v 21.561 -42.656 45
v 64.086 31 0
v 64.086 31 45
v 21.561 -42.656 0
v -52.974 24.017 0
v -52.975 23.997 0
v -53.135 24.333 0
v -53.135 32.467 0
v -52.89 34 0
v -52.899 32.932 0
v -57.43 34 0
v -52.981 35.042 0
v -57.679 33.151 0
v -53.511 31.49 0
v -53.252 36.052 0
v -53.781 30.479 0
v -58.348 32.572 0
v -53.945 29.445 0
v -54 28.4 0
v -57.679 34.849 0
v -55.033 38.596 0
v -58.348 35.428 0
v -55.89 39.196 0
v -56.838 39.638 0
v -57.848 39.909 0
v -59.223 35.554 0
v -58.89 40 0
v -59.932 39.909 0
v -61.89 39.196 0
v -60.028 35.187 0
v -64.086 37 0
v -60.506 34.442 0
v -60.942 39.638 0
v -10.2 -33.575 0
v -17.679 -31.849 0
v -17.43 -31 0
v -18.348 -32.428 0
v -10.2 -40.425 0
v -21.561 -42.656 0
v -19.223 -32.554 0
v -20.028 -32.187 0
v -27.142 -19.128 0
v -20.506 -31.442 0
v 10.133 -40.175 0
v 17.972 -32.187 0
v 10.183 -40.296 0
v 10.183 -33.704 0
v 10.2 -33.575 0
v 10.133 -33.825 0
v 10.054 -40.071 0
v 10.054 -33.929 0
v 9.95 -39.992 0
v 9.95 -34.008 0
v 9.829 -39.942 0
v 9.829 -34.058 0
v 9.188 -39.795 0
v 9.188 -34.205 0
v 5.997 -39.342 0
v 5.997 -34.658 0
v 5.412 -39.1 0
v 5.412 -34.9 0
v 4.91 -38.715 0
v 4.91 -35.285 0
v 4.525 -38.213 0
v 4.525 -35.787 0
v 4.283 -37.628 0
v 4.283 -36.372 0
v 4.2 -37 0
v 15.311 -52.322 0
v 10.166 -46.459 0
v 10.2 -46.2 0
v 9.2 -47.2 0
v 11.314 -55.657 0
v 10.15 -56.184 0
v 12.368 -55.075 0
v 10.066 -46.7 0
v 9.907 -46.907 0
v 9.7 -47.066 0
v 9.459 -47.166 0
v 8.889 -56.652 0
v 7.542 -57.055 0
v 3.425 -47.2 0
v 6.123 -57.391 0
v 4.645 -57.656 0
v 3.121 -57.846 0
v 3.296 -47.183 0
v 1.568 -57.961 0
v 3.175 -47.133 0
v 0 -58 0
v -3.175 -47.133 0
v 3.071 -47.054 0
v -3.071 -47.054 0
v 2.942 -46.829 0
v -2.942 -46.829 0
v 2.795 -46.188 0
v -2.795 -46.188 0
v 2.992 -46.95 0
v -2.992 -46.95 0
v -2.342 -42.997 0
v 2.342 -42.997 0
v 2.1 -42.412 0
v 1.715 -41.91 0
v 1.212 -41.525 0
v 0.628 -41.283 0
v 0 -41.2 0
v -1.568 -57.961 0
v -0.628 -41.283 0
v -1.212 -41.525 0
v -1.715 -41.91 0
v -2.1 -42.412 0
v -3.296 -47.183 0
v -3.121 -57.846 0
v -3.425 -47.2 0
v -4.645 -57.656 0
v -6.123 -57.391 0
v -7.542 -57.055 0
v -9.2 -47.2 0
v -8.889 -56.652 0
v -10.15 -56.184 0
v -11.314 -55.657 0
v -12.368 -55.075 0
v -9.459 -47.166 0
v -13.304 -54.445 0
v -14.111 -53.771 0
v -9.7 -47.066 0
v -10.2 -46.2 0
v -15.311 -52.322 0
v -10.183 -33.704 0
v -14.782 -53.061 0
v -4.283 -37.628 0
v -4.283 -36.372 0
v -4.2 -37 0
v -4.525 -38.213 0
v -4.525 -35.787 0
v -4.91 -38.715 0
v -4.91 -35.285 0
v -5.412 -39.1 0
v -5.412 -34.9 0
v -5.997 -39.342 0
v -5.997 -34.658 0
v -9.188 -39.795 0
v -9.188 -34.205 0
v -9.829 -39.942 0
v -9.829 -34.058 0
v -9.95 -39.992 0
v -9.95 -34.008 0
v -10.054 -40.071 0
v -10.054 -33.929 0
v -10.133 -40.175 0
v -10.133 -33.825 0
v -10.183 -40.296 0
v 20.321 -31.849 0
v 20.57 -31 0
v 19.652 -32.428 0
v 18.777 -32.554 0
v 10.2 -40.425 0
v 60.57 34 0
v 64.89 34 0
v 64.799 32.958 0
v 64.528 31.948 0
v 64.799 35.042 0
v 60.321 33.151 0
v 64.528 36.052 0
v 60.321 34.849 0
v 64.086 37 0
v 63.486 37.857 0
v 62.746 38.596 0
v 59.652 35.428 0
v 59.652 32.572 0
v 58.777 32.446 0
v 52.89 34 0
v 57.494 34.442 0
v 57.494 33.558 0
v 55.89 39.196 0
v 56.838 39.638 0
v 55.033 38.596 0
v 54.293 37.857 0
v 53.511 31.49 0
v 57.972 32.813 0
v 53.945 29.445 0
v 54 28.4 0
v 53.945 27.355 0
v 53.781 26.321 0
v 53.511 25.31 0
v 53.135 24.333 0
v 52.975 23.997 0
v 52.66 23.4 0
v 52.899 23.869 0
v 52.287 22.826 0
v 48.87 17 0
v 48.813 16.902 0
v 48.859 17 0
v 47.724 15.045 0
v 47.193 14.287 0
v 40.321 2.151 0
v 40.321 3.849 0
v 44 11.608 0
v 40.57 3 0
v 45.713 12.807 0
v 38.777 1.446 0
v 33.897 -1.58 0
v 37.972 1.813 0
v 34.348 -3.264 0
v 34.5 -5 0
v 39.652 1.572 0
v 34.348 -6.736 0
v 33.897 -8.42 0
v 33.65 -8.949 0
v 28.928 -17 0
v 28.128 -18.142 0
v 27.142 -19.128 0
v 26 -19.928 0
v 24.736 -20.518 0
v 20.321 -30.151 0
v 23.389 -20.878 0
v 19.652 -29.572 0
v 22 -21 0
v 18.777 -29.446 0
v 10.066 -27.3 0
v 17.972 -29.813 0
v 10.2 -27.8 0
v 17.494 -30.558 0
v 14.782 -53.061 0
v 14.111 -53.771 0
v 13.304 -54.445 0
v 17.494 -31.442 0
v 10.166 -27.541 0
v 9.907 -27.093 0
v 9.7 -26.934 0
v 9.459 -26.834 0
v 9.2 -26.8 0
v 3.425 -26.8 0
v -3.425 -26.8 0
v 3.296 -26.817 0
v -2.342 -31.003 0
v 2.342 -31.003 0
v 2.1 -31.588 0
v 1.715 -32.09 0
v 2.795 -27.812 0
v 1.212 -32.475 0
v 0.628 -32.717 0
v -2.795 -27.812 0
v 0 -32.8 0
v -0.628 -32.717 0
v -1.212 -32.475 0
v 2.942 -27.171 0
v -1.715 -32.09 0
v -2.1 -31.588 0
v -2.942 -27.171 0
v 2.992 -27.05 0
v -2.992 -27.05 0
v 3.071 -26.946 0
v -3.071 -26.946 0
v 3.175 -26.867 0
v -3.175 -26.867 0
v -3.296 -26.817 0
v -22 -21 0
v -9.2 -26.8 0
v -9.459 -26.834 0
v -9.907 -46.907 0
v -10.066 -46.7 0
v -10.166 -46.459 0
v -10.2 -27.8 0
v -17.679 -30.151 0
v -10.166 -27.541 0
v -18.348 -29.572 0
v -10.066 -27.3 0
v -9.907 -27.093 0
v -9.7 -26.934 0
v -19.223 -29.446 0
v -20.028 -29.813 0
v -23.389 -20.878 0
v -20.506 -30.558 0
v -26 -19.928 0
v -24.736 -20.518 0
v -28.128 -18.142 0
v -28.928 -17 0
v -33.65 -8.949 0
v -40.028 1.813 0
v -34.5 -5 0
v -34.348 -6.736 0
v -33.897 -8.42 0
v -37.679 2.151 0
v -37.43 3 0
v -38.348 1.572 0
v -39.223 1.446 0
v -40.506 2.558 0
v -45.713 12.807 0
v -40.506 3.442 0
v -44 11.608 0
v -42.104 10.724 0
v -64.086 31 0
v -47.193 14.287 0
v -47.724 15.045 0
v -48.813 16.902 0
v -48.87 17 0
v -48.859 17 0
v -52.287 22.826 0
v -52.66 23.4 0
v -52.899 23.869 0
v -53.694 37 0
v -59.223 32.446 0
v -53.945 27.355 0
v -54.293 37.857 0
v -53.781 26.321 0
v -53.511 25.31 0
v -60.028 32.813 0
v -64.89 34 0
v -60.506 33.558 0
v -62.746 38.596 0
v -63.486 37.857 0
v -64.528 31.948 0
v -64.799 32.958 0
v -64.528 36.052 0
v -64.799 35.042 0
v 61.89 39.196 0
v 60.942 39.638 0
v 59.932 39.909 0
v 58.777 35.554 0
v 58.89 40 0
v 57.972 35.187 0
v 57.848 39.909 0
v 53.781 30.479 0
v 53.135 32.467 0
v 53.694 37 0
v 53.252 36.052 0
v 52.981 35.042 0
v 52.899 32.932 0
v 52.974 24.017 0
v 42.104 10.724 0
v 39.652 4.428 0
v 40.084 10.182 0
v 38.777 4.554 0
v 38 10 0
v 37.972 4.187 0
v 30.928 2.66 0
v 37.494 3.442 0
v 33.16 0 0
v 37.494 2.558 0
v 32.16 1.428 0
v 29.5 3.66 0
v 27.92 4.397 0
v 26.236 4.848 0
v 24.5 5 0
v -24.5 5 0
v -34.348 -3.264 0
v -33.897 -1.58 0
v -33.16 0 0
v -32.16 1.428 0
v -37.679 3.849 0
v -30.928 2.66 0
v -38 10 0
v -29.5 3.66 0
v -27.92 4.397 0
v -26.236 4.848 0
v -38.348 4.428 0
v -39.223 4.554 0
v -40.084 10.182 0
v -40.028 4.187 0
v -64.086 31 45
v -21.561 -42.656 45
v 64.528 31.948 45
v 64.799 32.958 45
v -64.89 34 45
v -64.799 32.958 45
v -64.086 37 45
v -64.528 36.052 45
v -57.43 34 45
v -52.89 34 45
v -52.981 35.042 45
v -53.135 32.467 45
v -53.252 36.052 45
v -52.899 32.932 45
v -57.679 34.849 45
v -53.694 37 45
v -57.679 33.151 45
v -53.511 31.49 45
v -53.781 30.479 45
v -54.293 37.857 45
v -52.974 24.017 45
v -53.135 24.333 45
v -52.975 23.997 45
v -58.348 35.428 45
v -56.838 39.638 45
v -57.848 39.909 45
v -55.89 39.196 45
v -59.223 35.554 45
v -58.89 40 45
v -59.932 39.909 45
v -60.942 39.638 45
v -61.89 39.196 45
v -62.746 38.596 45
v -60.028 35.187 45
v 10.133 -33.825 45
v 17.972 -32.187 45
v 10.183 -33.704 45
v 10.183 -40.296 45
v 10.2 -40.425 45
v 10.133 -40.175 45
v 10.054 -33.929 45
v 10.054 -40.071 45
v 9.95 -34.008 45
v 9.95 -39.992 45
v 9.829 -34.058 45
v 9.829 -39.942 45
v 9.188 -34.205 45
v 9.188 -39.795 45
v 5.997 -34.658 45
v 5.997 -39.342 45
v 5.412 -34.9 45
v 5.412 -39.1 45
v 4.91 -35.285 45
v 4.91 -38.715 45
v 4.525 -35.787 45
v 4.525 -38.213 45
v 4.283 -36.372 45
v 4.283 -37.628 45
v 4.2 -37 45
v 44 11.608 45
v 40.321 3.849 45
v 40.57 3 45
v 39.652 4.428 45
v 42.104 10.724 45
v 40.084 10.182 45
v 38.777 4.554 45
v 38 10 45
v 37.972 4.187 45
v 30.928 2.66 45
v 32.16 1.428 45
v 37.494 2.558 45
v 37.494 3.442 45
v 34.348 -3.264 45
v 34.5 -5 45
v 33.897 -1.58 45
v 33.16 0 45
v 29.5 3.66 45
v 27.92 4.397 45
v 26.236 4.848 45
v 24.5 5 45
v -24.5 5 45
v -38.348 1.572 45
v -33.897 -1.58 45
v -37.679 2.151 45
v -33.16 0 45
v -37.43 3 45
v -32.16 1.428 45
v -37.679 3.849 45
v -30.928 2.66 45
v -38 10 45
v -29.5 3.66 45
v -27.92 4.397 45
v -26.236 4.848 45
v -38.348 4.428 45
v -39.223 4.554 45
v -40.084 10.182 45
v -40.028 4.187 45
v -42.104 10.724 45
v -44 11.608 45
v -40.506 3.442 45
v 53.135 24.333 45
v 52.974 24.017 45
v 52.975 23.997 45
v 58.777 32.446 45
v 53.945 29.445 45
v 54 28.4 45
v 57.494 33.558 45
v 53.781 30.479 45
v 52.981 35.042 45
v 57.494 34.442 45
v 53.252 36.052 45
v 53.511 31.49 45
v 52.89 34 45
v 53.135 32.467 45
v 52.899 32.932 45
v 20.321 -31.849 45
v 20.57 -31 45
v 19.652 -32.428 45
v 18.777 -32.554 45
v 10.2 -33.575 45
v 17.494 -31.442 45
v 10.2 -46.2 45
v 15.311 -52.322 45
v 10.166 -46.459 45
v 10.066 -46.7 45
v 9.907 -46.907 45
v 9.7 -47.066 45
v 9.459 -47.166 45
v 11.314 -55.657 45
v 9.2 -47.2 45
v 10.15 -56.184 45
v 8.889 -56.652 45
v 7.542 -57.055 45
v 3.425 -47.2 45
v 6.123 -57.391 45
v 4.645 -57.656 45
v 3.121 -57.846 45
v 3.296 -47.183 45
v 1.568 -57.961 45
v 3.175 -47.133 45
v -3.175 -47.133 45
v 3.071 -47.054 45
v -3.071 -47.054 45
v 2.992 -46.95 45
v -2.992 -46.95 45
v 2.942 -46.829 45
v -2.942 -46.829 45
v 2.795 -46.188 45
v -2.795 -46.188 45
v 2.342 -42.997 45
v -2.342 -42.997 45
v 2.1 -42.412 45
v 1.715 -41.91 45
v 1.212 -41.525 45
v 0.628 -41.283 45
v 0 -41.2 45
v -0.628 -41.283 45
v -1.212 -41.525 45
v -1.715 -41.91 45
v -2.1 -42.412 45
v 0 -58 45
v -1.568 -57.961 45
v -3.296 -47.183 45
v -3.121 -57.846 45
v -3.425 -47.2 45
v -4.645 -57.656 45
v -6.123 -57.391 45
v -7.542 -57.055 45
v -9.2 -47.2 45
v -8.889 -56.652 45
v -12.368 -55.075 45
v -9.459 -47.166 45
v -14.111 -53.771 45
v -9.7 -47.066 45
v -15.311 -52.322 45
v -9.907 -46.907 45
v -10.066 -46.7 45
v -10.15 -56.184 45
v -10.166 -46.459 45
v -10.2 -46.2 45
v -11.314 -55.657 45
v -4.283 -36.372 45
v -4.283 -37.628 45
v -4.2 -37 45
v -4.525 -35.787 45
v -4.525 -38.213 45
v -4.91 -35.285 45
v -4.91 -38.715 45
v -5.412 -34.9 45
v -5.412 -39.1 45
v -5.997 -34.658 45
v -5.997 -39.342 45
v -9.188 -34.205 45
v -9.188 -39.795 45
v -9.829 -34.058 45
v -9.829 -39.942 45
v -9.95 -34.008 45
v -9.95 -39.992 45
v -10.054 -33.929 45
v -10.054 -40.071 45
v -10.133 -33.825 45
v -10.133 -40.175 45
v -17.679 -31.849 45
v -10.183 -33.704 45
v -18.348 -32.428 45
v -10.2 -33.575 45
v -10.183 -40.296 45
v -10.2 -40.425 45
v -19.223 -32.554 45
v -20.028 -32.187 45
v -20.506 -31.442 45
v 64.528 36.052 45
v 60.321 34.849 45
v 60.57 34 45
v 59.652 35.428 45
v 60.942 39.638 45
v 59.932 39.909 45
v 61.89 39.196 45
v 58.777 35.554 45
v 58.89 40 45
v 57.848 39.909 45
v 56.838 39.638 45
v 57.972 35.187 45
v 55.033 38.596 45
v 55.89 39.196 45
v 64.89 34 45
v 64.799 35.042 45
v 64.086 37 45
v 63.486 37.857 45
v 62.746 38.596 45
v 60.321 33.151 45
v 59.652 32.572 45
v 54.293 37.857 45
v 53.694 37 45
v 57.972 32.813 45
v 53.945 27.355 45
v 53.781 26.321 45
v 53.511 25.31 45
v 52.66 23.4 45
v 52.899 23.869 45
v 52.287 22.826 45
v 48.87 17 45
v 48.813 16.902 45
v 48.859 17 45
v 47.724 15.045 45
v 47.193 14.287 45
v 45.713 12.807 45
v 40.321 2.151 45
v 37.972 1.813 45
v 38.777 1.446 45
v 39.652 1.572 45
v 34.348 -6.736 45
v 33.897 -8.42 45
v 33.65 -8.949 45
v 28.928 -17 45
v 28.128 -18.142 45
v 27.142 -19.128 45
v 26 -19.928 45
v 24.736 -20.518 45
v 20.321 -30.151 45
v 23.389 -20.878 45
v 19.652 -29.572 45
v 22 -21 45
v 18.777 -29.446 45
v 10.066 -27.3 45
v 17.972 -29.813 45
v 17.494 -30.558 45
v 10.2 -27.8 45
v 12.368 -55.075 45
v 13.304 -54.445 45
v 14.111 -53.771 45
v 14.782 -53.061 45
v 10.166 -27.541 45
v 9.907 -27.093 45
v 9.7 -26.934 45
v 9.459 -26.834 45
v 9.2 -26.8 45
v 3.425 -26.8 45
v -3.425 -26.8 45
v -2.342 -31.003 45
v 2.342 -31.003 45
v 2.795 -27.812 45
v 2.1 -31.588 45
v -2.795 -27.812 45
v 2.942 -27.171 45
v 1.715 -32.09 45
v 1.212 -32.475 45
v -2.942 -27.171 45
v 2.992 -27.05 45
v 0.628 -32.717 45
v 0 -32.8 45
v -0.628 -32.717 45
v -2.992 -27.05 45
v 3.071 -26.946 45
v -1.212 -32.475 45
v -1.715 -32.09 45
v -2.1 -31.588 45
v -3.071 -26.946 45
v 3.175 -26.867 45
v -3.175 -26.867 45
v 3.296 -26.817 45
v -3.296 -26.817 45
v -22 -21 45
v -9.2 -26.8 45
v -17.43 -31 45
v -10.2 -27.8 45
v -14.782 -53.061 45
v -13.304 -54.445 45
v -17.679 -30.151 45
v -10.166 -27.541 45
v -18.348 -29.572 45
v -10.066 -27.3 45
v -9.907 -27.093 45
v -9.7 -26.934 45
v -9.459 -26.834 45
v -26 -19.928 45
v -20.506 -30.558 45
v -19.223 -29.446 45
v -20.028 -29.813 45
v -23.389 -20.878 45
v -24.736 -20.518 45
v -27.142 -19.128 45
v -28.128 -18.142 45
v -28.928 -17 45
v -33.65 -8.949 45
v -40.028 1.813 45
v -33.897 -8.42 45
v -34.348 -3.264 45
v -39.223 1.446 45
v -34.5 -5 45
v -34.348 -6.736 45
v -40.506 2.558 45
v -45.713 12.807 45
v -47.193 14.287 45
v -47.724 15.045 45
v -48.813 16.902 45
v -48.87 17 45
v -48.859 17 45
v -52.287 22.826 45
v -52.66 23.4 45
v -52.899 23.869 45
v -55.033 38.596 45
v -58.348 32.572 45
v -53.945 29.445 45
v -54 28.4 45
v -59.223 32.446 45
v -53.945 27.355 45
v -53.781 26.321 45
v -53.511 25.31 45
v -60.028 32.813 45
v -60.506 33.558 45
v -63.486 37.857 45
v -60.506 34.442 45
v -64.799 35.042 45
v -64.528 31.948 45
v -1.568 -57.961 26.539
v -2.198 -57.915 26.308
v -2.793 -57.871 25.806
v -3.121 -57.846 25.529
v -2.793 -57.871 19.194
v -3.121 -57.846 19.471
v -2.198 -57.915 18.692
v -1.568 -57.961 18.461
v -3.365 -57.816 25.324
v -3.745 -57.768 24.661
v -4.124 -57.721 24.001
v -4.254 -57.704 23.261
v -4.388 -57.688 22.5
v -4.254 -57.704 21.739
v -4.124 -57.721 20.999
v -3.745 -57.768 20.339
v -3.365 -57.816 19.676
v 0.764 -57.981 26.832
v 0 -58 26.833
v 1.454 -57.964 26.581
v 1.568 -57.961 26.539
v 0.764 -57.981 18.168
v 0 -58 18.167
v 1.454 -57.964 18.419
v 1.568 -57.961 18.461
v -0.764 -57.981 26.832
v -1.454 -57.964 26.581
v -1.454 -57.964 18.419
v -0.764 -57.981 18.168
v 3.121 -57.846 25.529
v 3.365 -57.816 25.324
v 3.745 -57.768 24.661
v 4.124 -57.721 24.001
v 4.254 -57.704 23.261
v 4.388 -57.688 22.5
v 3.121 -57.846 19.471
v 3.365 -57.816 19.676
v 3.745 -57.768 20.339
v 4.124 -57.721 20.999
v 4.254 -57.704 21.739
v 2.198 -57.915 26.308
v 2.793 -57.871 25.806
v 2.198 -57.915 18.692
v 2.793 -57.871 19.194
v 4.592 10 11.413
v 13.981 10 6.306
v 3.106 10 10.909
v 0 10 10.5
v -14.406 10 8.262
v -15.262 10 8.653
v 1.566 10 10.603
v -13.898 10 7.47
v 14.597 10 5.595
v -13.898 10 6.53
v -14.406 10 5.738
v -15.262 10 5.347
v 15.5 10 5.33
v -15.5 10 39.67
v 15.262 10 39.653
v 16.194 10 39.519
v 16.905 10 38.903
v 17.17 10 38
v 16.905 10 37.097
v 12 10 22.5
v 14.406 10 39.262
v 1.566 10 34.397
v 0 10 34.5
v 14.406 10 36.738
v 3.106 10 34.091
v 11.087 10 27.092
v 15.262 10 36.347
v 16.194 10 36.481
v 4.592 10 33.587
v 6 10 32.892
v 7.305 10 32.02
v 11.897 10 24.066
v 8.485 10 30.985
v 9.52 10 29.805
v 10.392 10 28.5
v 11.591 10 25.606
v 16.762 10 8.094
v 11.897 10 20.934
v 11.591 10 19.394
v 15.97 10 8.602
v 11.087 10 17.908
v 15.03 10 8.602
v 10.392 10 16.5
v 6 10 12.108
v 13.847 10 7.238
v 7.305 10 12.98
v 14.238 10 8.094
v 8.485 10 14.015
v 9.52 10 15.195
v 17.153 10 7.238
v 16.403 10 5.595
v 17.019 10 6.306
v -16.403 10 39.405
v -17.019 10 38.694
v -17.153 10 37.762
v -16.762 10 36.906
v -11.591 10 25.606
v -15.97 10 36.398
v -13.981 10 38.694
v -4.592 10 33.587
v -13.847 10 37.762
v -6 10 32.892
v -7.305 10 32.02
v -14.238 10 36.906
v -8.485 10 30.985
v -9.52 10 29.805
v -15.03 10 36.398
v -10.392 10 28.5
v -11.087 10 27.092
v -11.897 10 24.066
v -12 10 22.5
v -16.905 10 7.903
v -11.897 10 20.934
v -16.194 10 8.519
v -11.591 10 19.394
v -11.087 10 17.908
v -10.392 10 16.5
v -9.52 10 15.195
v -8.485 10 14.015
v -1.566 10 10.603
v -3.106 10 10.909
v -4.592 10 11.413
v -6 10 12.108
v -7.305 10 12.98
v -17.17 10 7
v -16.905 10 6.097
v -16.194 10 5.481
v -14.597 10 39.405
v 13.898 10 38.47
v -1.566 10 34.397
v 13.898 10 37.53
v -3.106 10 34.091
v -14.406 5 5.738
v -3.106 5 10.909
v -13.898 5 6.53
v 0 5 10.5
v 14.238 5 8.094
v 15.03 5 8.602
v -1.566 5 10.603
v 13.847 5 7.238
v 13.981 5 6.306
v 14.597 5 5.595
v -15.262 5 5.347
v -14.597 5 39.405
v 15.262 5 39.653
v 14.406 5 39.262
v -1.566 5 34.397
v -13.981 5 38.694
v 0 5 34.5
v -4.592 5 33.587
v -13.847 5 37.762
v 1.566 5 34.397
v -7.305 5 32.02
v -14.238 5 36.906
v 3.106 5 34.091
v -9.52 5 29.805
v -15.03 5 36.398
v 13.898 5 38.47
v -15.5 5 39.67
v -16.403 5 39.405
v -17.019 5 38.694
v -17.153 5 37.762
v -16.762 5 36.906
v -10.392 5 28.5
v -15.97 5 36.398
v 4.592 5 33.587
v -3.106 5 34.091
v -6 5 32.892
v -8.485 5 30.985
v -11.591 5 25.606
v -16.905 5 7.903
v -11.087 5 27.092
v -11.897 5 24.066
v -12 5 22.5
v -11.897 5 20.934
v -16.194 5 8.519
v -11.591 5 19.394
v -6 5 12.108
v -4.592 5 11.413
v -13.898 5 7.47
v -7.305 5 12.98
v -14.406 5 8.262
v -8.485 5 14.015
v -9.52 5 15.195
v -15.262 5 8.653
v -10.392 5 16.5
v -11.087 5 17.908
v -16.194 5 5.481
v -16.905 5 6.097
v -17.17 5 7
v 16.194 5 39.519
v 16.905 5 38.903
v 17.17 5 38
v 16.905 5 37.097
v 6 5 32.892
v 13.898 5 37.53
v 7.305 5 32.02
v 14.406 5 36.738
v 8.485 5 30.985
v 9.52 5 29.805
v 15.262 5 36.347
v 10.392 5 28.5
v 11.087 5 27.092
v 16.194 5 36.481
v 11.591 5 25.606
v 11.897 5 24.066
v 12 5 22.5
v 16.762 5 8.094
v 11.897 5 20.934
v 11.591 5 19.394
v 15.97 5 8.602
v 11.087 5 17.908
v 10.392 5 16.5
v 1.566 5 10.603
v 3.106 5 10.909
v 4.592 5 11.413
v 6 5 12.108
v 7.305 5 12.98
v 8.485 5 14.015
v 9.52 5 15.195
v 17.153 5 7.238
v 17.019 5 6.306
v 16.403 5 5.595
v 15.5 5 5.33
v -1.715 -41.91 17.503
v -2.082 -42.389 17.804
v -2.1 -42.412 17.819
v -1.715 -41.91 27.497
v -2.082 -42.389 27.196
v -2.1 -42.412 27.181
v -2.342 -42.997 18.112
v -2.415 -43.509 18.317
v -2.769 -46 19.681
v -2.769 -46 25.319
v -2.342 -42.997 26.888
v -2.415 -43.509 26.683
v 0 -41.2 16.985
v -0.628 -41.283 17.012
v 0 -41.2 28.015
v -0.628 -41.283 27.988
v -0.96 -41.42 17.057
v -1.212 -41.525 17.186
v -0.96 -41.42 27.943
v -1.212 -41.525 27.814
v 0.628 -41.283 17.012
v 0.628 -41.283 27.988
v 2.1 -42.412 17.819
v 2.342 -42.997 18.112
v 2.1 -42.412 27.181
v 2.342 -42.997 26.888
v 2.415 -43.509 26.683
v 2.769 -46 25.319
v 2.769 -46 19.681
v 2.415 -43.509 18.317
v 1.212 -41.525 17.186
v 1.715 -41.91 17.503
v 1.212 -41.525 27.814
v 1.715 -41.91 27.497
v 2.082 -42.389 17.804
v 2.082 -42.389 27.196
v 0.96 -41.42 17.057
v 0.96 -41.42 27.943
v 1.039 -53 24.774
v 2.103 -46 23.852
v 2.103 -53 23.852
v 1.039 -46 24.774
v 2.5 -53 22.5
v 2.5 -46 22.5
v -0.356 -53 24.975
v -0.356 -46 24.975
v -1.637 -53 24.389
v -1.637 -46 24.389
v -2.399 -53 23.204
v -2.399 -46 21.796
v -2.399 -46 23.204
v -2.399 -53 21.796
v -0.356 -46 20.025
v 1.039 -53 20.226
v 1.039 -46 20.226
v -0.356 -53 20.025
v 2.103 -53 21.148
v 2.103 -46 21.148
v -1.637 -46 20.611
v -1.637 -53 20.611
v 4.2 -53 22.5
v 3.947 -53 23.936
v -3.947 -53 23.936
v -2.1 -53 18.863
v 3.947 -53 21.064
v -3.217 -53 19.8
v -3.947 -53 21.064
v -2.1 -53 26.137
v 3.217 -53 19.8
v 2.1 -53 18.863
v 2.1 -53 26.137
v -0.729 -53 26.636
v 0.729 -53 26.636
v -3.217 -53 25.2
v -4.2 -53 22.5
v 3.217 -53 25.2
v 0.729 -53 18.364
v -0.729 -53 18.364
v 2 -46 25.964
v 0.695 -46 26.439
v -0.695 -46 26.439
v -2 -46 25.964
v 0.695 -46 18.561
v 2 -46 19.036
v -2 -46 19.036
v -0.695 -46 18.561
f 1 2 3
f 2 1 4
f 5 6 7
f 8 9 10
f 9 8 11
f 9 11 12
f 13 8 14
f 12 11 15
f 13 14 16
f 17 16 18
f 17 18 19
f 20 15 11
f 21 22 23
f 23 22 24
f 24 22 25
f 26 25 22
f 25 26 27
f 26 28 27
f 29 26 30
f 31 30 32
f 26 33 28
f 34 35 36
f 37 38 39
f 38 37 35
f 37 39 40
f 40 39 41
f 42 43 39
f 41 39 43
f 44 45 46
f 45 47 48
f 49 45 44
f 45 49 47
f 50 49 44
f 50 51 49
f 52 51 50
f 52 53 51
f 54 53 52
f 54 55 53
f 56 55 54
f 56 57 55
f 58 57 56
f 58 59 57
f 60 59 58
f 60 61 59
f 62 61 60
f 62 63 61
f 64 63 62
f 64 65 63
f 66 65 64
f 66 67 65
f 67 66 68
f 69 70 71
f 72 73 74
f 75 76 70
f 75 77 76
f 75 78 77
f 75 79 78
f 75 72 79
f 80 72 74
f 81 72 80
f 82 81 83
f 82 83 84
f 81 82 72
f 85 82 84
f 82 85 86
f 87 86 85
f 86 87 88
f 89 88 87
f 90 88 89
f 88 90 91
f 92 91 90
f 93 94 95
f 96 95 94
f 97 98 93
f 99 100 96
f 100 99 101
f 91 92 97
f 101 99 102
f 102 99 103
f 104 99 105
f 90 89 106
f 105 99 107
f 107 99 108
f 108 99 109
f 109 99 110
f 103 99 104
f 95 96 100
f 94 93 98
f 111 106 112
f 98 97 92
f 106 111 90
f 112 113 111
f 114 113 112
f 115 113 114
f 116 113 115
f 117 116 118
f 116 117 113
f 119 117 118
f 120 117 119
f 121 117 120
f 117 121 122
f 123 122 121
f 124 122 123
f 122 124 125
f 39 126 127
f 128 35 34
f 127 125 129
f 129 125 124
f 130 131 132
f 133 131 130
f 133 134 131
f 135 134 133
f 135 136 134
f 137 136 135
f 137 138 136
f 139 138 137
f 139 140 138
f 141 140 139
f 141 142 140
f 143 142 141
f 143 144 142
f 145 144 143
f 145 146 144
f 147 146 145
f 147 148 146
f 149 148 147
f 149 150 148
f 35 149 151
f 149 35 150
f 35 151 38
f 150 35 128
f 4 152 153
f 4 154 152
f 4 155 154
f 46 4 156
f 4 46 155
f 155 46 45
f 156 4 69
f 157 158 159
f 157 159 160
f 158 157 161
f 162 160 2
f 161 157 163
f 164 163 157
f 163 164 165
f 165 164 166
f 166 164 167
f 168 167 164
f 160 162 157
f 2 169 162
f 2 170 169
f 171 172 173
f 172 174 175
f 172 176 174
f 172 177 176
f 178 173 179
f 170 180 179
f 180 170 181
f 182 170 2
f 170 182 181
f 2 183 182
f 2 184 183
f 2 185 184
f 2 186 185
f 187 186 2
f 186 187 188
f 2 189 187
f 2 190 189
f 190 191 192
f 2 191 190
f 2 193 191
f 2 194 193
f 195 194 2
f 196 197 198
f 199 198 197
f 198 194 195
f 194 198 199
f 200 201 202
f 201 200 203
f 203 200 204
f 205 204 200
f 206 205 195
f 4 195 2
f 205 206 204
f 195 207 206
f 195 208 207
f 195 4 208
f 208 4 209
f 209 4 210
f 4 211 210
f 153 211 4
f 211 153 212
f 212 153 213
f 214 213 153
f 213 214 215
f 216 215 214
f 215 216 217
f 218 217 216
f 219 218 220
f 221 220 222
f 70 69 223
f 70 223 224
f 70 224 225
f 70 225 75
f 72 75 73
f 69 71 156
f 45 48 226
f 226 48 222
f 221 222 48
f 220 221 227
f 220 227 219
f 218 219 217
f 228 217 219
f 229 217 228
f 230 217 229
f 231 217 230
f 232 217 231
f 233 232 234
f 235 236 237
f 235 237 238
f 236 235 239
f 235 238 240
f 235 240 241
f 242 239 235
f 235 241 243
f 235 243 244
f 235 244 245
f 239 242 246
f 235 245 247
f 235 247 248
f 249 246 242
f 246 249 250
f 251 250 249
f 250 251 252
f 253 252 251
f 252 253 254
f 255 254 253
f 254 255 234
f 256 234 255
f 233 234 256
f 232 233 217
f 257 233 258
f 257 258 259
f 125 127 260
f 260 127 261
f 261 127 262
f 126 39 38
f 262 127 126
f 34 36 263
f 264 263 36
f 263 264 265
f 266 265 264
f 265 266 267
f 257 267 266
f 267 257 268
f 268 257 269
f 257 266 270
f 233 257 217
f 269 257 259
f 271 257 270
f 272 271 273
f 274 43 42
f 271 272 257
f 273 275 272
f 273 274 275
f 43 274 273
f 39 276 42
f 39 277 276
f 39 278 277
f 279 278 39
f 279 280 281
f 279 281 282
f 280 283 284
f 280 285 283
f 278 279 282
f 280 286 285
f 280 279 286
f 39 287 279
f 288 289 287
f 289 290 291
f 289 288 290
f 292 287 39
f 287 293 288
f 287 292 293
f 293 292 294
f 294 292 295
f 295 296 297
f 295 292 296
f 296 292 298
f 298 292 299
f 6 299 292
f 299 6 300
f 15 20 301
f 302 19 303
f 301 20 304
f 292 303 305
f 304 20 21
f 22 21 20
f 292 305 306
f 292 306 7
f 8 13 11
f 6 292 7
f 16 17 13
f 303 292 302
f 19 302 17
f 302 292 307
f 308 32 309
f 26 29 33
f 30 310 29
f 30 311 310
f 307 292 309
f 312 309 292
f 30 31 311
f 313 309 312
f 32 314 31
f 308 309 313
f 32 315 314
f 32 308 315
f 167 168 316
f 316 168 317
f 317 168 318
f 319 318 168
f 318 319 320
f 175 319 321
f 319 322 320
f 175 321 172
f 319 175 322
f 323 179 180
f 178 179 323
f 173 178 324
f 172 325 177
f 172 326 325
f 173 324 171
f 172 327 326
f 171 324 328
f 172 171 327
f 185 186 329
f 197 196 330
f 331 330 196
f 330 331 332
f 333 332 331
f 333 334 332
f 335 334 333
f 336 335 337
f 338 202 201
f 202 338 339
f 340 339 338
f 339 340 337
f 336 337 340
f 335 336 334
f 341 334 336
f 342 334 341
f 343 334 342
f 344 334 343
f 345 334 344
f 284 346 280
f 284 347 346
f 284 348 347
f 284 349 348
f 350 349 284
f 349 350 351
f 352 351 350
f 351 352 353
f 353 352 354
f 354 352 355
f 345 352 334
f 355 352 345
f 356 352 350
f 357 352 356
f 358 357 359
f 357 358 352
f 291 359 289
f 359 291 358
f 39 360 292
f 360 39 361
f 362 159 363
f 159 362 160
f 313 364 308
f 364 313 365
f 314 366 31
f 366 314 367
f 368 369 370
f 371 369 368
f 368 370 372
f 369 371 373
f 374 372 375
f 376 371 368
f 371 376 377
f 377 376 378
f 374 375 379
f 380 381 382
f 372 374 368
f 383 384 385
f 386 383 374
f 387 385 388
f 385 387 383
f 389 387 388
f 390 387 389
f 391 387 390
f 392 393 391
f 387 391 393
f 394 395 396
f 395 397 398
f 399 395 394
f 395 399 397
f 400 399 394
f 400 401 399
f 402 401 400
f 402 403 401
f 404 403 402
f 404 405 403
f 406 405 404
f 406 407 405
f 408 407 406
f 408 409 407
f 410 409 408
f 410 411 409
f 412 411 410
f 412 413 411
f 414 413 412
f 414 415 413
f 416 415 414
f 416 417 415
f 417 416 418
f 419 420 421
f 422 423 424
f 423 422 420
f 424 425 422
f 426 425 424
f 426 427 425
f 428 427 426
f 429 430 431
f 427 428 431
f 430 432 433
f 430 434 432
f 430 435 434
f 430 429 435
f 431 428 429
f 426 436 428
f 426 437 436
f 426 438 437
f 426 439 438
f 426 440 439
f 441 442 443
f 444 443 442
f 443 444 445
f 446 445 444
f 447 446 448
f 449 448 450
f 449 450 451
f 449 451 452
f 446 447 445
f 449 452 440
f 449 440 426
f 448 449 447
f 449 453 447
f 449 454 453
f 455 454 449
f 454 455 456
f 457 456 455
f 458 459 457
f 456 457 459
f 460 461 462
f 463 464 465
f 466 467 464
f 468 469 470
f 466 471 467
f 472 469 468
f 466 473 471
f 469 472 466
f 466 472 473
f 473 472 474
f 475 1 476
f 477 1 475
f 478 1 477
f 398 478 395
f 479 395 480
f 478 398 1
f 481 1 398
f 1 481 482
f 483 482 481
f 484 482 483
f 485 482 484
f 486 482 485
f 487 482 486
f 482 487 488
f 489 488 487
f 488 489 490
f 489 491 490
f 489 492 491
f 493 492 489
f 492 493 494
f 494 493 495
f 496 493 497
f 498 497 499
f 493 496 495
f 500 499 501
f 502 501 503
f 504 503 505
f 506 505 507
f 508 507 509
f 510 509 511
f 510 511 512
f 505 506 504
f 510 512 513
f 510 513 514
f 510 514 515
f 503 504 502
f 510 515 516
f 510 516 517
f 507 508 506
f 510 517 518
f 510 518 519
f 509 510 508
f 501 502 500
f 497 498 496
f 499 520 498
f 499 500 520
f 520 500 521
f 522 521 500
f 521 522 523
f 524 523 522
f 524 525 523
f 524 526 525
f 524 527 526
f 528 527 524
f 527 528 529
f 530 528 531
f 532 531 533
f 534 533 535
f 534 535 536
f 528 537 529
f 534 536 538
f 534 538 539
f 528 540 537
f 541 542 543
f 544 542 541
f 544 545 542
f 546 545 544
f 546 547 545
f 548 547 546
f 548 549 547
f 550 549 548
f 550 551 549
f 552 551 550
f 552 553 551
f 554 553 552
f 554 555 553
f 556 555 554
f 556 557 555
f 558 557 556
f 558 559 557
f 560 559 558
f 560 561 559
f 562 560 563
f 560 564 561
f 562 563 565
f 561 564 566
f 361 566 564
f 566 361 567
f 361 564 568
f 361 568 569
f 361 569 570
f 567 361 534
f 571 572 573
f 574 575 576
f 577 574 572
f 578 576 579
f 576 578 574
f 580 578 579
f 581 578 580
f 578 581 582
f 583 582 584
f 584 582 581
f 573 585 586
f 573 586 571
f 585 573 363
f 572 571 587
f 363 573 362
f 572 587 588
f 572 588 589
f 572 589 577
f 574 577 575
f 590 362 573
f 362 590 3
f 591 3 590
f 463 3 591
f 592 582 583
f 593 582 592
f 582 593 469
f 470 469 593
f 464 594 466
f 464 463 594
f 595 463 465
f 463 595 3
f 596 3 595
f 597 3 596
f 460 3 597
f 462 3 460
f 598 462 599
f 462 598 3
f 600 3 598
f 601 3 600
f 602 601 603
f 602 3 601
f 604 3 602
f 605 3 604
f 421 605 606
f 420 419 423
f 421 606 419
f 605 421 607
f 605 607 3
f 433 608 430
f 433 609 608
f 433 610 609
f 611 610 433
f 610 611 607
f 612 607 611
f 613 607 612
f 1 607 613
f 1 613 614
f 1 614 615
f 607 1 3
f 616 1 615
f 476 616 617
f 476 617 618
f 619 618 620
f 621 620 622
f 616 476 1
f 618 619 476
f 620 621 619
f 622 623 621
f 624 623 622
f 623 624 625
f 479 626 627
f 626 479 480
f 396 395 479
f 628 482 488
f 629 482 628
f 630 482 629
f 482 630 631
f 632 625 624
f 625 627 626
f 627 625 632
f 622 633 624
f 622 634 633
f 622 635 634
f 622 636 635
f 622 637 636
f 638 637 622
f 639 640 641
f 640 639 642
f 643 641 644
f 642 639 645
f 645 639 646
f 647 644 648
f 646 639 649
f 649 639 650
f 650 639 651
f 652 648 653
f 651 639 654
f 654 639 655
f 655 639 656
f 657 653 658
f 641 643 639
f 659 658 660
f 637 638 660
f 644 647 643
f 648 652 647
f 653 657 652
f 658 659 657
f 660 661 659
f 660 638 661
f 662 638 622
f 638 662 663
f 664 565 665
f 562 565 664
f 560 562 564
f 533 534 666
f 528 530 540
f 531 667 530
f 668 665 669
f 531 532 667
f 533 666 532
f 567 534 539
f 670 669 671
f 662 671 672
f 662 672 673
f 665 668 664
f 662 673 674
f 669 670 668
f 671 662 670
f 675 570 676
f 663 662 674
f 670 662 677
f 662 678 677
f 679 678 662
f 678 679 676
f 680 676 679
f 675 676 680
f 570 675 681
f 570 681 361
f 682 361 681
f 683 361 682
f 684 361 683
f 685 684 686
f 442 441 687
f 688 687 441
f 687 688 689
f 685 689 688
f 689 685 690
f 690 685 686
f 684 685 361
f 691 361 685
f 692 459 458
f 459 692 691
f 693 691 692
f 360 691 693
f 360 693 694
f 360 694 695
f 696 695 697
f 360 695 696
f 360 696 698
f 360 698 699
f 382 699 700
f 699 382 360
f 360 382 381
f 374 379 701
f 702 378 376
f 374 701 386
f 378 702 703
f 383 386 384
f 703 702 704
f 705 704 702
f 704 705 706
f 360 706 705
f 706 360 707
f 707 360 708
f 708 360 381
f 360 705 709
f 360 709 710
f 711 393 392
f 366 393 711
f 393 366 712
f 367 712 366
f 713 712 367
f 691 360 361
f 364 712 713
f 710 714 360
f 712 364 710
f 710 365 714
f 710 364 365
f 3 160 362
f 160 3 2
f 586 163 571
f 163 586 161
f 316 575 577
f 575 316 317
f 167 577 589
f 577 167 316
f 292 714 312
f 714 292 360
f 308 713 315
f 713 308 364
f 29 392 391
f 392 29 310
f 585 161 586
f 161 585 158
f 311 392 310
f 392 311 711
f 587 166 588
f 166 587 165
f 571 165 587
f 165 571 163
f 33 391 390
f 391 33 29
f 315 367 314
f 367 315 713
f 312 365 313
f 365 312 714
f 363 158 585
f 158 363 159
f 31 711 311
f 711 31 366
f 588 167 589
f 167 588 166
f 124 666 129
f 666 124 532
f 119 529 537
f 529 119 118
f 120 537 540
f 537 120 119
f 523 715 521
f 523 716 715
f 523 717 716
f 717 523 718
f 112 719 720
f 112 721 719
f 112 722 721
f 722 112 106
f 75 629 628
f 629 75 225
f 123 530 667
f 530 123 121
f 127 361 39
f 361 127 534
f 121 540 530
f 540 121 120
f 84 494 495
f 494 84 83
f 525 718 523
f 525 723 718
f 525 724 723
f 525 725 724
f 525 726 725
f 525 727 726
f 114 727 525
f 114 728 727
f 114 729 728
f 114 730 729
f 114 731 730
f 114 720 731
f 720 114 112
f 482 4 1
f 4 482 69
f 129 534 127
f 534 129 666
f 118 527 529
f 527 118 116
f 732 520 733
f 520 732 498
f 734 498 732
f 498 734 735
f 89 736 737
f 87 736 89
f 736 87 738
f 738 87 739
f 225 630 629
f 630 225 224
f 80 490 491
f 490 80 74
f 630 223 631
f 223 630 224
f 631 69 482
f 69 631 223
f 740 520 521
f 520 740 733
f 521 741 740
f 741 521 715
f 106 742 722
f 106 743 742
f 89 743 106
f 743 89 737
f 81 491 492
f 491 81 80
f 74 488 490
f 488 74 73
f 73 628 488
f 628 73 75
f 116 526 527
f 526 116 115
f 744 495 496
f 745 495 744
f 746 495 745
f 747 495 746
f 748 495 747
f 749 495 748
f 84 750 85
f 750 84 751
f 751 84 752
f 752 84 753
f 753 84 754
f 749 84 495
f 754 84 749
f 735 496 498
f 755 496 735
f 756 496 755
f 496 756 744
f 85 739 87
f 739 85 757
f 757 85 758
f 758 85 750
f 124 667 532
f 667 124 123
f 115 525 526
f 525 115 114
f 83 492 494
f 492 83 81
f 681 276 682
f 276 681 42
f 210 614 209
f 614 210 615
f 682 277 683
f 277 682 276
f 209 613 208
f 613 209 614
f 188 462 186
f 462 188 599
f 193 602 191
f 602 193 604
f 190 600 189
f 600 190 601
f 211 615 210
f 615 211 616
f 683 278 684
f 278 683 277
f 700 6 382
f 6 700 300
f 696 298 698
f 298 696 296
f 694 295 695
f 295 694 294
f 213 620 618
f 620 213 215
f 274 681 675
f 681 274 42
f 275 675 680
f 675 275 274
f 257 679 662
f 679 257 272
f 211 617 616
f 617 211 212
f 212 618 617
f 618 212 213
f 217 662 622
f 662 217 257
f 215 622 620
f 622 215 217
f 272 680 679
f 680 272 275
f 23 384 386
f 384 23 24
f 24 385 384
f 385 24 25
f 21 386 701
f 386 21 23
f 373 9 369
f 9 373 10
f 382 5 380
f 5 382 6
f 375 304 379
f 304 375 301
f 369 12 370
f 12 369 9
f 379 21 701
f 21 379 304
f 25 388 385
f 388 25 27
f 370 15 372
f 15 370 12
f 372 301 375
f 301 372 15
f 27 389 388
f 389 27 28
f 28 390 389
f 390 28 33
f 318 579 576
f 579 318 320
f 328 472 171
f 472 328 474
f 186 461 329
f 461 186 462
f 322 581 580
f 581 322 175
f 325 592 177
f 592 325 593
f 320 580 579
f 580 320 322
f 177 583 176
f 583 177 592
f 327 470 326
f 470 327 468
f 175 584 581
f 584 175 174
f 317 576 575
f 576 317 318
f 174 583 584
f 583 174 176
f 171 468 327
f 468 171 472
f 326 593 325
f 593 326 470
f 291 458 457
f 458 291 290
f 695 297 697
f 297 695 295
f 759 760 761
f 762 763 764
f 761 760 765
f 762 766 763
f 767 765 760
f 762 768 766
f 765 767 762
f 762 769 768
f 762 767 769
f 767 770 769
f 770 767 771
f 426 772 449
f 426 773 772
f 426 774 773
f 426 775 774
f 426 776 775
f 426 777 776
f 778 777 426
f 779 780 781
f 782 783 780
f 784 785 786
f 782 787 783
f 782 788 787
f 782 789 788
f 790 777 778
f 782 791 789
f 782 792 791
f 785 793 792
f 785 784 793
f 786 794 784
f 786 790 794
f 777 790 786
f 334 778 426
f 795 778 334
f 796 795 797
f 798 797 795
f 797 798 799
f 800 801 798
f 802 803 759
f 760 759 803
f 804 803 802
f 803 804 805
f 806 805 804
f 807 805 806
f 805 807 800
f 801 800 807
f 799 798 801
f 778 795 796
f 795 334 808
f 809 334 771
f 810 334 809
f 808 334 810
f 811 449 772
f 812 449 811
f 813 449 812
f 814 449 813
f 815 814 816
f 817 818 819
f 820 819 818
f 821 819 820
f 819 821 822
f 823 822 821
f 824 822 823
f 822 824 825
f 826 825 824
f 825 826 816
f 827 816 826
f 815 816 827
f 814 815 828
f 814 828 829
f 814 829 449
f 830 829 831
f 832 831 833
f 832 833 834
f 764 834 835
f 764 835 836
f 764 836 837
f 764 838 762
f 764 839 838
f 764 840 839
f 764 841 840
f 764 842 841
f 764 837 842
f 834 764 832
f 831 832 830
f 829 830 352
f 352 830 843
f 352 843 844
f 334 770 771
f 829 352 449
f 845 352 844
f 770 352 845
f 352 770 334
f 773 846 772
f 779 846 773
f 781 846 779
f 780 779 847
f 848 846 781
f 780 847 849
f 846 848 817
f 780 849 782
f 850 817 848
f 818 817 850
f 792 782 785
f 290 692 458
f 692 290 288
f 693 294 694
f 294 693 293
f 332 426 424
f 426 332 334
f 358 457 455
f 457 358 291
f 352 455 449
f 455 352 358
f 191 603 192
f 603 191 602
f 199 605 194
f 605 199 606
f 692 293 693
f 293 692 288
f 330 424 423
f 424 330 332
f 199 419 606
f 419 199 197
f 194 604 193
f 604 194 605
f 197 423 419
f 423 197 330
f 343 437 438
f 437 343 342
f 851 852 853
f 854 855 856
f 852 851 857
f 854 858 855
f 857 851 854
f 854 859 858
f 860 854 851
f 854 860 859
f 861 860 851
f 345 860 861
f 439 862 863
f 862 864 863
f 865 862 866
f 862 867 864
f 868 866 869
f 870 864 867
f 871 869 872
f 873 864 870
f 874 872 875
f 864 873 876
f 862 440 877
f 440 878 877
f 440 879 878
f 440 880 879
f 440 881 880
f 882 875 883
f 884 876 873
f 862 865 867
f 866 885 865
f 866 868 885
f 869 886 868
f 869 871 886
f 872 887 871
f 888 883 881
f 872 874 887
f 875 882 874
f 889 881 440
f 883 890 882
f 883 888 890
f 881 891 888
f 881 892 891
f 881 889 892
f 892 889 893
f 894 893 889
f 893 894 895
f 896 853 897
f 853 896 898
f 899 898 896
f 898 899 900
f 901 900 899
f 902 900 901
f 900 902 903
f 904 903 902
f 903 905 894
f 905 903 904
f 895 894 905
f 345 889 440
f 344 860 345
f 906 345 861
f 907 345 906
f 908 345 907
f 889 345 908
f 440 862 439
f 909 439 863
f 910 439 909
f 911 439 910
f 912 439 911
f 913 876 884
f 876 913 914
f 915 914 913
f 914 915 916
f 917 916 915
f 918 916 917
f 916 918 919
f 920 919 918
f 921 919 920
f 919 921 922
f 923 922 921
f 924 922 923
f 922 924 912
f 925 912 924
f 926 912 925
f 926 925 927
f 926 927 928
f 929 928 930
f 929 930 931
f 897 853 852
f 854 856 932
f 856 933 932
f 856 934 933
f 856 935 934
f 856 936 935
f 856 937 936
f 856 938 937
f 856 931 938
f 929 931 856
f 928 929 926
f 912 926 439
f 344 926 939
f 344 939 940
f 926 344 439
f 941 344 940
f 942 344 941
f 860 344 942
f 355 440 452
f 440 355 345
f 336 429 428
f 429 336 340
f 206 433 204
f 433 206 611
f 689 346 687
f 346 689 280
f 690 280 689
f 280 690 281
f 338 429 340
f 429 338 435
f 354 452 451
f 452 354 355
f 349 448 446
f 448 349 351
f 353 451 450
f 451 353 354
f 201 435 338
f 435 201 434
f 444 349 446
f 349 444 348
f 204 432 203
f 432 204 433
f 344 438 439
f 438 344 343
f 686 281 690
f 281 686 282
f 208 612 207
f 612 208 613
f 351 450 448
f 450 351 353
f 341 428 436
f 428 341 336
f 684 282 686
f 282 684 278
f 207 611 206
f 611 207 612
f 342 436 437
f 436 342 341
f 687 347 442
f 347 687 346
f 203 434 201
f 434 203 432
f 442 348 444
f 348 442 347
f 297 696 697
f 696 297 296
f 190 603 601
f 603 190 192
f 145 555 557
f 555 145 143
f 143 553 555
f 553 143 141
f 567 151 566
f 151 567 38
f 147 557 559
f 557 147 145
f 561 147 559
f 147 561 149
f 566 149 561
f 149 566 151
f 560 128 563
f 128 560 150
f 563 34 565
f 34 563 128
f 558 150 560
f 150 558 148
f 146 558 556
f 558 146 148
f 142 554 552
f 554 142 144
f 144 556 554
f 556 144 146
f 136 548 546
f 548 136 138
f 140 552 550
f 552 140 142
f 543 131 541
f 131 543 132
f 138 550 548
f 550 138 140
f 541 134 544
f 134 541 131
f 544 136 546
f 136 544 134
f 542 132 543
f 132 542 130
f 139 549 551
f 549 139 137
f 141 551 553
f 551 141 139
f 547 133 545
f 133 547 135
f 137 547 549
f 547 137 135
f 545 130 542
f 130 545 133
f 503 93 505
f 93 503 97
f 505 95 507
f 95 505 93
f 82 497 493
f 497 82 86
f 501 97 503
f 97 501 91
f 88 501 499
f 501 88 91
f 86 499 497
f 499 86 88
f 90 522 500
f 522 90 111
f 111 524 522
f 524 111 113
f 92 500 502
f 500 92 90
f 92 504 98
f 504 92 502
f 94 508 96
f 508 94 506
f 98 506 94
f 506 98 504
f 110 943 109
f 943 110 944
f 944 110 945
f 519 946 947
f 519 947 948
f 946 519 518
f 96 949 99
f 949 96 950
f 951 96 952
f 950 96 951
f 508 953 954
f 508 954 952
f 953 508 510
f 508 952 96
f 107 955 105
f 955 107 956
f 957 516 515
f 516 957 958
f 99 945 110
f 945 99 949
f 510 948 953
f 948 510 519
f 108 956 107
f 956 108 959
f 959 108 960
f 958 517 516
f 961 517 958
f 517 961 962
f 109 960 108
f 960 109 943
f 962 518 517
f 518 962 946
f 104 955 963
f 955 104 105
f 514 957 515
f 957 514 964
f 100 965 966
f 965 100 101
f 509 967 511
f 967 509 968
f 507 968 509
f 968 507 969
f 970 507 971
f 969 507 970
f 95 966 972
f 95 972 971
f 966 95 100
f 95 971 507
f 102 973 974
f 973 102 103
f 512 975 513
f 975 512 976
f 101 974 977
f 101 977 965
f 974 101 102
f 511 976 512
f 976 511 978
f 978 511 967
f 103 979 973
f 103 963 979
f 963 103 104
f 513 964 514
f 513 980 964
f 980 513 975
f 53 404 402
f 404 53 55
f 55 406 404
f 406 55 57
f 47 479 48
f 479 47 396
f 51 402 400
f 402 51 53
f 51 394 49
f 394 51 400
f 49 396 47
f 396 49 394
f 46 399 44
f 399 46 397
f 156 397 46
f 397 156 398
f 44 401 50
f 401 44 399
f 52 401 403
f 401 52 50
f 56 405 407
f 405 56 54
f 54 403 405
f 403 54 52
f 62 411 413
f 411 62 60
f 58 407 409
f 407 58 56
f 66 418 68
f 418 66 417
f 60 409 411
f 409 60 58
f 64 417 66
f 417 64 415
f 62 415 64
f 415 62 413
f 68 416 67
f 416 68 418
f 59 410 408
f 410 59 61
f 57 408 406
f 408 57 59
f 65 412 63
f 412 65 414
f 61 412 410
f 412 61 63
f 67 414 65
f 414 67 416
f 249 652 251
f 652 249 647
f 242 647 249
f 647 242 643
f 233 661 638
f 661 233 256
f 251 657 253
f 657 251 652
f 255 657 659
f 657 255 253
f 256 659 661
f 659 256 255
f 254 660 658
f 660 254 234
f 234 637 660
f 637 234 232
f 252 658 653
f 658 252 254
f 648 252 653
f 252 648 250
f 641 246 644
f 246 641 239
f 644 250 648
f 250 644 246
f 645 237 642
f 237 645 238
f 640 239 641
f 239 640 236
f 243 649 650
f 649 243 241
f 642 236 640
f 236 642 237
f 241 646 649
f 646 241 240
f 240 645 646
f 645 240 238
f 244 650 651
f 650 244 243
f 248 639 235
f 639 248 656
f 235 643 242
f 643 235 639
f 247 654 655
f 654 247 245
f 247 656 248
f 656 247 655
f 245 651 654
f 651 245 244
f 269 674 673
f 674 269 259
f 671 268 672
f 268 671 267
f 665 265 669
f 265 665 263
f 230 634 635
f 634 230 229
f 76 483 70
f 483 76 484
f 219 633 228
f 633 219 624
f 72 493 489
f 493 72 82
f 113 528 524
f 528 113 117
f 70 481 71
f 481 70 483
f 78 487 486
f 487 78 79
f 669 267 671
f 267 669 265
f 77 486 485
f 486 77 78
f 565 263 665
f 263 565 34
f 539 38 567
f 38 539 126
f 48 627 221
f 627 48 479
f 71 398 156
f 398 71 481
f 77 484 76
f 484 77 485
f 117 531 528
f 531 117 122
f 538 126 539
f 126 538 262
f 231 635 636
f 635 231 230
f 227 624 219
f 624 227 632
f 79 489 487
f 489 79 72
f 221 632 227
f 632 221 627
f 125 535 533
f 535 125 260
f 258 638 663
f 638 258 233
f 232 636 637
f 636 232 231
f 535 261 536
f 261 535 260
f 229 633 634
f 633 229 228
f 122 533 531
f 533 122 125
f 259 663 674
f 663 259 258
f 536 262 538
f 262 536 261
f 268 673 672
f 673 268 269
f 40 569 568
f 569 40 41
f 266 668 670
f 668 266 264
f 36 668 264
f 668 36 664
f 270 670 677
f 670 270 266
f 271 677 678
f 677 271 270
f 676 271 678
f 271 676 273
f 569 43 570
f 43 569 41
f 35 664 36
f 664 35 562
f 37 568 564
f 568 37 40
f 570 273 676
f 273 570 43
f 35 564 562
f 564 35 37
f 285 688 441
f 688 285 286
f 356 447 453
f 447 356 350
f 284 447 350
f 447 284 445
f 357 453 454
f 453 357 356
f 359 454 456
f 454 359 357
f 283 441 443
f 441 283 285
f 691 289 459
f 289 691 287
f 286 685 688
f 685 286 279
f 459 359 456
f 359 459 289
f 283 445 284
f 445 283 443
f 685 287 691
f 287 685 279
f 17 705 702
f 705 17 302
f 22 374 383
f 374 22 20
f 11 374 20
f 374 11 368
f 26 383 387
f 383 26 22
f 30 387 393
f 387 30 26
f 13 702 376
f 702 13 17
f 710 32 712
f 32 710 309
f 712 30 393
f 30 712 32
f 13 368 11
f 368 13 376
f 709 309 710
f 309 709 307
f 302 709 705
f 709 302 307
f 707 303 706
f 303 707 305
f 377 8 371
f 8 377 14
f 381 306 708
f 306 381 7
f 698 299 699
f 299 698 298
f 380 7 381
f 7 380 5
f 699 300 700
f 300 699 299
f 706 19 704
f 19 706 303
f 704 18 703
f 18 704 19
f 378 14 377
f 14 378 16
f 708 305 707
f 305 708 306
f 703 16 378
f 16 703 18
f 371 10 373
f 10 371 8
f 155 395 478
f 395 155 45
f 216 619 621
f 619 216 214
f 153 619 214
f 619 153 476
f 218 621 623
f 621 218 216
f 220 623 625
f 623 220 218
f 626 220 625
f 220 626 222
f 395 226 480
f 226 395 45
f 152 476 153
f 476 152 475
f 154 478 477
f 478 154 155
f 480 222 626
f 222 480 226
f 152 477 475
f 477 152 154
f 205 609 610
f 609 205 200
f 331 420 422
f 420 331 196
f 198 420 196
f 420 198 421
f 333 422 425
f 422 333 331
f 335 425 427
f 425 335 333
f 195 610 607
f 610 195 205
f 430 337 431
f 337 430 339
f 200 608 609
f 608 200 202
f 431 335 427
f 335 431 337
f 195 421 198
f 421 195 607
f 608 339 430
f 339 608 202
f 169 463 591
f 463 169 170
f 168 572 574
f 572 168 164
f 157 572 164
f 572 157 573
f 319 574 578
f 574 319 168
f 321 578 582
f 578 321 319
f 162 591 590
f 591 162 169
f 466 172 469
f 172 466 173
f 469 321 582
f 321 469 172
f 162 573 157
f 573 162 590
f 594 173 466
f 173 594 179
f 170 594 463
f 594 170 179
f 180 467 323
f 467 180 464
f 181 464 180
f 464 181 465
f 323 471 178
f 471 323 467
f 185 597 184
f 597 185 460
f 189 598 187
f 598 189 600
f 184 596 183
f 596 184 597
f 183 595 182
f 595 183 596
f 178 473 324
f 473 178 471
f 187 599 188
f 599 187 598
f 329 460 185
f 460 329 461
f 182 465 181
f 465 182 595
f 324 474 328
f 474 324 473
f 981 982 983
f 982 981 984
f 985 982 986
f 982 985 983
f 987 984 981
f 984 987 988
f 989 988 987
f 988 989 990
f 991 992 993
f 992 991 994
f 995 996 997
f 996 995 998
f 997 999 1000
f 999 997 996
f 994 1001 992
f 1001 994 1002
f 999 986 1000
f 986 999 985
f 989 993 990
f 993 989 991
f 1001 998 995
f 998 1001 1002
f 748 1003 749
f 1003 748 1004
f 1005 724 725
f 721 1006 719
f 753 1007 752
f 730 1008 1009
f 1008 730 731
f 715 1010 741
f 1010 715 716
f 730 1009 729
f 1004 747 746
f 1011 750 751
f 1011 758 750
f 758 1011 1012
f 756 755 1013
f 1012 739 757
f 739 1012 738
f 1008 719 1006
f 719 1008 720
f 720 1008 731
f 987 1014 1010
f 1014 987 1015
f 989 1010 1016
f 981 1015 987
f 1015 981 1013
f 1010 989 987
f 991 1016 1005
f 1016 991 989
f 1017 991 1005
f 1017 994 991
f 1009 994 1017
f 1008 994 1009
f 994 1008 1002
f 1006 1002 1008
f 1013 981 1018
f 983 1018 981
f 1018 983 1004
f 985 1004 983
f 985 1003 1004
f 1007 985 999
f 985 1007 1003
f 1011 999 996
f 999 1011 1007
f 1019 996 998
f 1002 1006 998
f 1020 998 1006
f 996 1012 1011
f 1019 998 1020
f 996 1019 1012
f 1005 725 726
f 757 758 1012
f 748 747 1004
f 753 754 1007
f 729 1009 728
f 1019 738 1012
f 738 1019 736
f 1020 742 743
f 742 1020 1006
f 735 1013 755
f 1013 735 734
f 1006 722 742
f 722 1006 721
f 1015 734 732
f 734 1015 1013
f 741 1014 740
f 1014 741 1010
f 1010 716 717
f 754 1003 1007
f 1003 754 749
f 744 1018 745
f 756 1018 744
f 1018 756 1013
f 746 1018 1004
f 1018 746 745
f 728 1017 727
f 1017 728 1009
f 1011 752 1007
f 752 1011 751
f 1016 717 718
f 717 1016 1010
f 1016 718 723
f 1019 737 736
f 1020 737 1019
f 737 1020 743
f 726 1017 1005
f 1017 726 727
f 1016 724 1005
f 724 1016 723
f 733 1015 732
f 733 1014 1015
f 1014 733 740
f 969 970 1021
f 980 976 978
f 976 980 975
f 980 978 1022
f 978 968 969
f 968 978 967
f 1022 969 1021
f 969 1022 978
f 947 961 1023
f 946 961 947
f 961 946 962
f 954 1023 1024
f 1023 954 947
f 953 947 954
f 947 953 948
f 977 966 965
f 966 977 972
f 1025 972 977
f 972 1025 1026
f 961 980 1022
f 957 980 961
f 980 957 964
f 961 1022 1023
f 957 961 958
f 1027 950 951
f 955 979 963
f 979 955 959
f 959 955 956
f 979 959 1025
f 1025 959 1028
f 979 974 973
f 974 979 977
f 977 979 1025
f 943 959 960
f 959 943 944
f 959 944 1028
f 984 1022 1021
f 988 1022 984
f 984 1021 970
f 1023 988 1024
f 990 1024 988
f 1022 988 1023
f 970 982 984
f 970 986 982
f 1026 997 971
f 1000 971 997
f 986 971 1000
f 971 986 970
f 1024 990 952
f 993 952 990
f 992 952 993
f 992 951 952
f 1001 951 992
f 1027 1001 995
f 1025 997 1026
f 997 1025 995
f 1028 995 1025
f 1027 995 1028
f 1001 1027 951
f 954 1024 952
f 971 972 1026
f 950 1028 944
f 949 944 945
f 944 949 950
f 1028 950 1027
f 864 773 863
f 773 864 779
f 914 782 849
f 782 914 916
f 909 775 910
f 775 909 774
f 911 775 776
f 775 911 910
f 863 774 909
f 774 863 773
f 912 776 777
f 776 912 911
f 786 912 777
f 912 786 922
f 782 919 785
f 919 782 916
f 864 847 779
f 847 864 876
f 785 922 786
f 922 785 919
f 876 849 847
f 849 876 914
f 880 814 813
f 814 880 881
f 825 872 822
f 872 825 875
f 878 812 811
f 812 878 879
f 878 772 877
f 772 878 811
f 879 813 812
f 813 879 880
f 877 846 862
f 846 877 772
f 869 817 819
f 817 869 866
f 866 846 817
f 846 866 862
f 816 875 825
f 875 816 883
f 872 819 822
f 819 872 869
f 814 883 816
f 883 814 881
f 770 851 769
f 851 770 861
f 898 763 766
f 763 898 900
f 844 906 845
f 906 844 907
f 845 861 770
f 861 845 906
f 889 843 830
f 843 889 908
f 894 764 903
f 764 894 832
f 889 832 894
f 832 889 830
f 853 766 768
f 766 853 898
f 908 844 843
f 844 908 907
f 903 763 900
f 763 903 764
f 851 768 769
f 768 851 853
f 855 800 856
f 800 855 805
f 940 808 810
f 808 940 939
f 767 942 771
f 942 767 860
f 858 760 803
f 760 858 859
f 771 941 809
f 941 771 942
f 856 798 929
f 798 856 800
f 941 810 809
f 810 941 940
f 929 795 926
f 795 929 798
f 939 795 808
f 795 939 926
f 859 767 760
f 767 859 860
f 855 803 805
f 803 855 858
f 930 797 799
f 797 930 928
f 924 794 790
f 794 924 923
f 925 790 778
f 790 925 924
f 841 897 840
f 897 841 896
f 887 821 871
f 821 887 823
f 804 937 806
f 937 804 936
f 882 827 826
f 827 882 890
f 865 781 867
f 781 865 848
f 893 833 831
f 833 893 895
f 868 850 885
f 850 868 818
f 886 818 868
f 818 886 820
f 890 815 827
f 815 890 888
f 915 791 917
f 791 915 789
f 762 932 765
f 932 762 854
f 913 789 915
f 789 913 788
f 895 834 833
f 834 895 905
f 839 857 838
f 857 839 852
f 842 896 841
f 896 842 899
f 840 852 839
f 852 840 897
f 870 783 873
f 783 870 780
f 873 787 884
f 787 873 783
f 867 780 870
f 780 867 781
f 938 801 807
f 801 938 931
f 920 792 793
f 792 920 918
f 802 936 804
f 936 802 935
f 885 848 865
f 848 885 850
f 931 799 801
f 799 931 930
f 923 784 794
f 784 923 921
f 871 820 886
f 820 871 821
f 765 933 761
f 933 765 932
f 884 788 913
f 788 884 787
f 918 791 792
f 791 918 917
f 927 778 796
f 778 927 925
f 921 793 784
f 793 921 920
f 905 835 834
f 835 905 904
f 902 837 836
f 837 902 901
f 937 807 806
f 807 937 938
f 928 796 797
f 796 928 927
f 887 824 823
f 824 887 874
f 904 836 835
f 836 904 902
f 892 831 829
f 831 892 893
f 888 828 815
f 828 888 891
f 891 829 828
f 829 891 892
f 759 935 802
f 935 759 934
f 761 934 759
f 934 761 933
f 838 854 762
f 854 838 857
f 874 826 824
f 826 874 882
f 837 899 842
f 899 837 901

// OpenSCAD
// file: configuration.scad
// Increase this if your slicer or printer make holes too tight.
extra_radius = 0.1;

// OD = outside diameter, corner to corner.
m3_nut_od = 6.1;
m3_nut_radius = m3_nut_od/2 + 0.2 + extra_radius;

// Major diameter of metric 3mm thread.
m3_major = 2.85;
m3_radius = m3_major/2 + extra_radius;
m3_wide_radius = m3_major/2 + extra_radius + 0.2;

// NEMA17 stepper motors.
motor_shaft_diameter = 5;
motor_shaft_radius = motor_shaft_diameter/2 + extra_radius;

// Frame brackets.
thickness = 3.6;
// file: ext20.scad
module slotT625a(w,rs,re,len) {
$fn=24;
  hull() {
    translate([-w/2+re,-rs-re,0]) cylinder(r=re,h=len);
    translate([  -1   ,-rs-5 ,0]) cube([1,7,len]);
    translate([-w/2-0.5,-10  ,0]) cube([w/2,1,len]);
  }
}

module slotT625(len,fuzz) {
rs=6.25/2-fuzz;
d=6;
re=0.5;
$fn=24;
w=20+fuzz*2;
  difference() {
    translate([-w/2-2,-9,0]) cube([w/2+2,18,len]);

    translate([0,0,-1]) difference() {
      union() {
        translate([-w/2+3,-10,0]) cube([w/2-2,20,len+2]);
        slotT625a(w,rs,re,len+2);
        mirror([0,1,0]) slotT625a(w,rs,re,len+2);
      }

      translate([-w/2,0,-1]) hull() {
        translate([0,-rs,0]) cube([0.1,2*rs,len+2]);
        translate([d-rs+.5,0,0]) cylinder(r=rs-.5,h=len+2);
      }
    }
  }
}

module ext20(len,fuzz) {
w=20+fuzz*2;
ro=1;
$fn=24;
  difference() {
    hull() {
      translate([-w/2+ro,-w/2+ro,0]) cylinder(r=ro,h=len);
      translate([-w/2+ro, w/2-ro,0]) cylinder(r=ro,h=len);
      translate([ w/2-ro, w/2-ro,0]) cylinder(r=ro,h=len);
      translate([ w/2-ro,-w/2+ro,0]) cylinder(r=ro,h=len);
    }

    translate([0,0,-1]) {
      for (a=[0,90,180,270]) {
        rotate([0,0,a])
          slotT625(len+2,fuzz);
      }
      %cylinder(r=4.25/2,h=len+2);
    }
  }
}

ext20(5,0.2);
// file: nema17.scad
include <configuration.scad>;

module nema17() {
  // NEMA 17 stepper motor.
  difference() {
    union() {
      translate([0, 0, -motor_length/2]) intersection() {
        cube([42.2, 42.2, motor_length], center=true);
        cylinder(r=25.1, h=motor_length+1, center=true, $fn=60);
      }
      cylinder(r=11, h=4, center=true, $fn=32);
      cylinder(r=2.5, h=48, center=true, $fn=24);
    }
    for (a = [0:90:359]) {
      rotate([0, 0, a]) translate([15.5, 15.5, 0])
        cylinder(r=m3_radius, h=10, center=true, $fn=12);
    }
  }
}

module nema17holes() {
  cylinder(r=11+1, h=4+5, $fn=48);
  cylinder(r=2.5+.2, h=25, $fn=36);
  for (a = [0:90:359]) {
    rotate([0, 0, a]) translate([15.5, 15.5, 0])
      cylinder(r=2.94/2+.2, h=10, $fn=11);
  }
}

nema17();
%nema17holes();
// file: vertexB.scad
use <ext20.scad>;

module vertexBframe(thick) {
t2 = thick+2;
  union() {
    difference() {
      intersection() {
        hull() for(a=[0,120,240]) rotate([0,0,a])
          translate([0,-68,0]) cylinder(r=6,h=thick,$fn=36);
        translate([0,0,-1]) hull() {
          translate([0,-50,0]) 
            scale([16,8,1]) cylinder(r=1,h=t2+2,$fn=64);
          translate([-75,40,0]) cube([150,4,t2]);
        }
      }

      // clear out main interior V
      hull() {
        for(a=[-1,1]) { translate([22*a,-13,-1]) cylinder(r=8,h=t2,$fn=36); }
        translate([0,45,thick/2]) cube([130,1,t2],center=true);
      }
    }

    // diagnostic ruler.  We want about 36mm between front of nema17
    // and front edge of extrusion
    %translate([0,-9,9]) cube([2,36,t2*2],center=true);

    for(a=[-1,1]) {
      hull() {
        translate([cos(30)*68*a,68/2,0]) cylinder(r=6,h=thick,$fn=36);
        translate([54*a,21,0]) cylinder(r=1,h=thick,$fn=6);
      }
    }
  }
}

// brace across vertex.  custom sizing
module braceRail(thick) {
t2 = thick+2;
  difference() {
    translate([-55,-15,0]) cube([110,27,thick]);

    translate([0,0,-1]) {  // make all subtractions a little wide to make sure it is a clean cut
      hull() {
        for (a=[-1,1]) { translate([38*a,17,0]) cylinder(r=12,h=t2,$fn=36); }
      }
      hull() {
        for (a=[-1,1]) { translate([24.5*a,-10,0]) cylinder(r=10,h=t2,$fn=36); }
      }
      for(a=[-1,1]) { translate([54*a,-7,t2/2]) rotate([0,0,-30*a])
        cube([20,50,t2],center=true);
      }
    }
  }
}

module m3hole(thick) { cylinder(r=2.94/2+.1, h=thick+2, $fn=11); }

module vertexB(thick) {
  difference() {
    union() {
      vertexBframe(thick);
      translate([0,5,0]) braceRail(thick);
    }

    translate([0,0,-1]) {
      translate([0,-37,0]) ext20(thick+11,0.2);

      // M3 drill holes
      for(a=[-1,1]) {
        translate([19*a,-31,0]) m3hole(thick);
        translate([39*a,  3,0]) m3hole(thick);
        translate([59*a, 34,0]) m3hole(thick);

        //smooth outer ear transition
        translate([44*a,28.4,0]) cylinder(r=10,h=thick+2,$fn=60);
      }
    } // end of z=-1 shift for subtractions

    // extrusion anchor screw
    translate([0,-37,thick/2]) rotate([90,0,0]) {
      cylinder(r=5/2,h=30, $fn=11);
      translate([0,0,21-5]) cylinder(r1=4.2,r2=4.6,h=10,$fn=18);
      translate([0,0,  3 ]) cylinder(r1=6  ,r2=4  ,h=6 ,$fn=18);
    } 

  } // end of difference   
}

vertexB(13);
// main file
use <vertexB.scad>;
use <nema17.scad>;

module frameBot() {
  difference() {
    vertexB(45);

    translate([0,12,45/2]) rotate([90,0,0]) {
      #nema17holes();
      //translate([0,0,2])%nema17();
    }

  }
}

frameBot();
